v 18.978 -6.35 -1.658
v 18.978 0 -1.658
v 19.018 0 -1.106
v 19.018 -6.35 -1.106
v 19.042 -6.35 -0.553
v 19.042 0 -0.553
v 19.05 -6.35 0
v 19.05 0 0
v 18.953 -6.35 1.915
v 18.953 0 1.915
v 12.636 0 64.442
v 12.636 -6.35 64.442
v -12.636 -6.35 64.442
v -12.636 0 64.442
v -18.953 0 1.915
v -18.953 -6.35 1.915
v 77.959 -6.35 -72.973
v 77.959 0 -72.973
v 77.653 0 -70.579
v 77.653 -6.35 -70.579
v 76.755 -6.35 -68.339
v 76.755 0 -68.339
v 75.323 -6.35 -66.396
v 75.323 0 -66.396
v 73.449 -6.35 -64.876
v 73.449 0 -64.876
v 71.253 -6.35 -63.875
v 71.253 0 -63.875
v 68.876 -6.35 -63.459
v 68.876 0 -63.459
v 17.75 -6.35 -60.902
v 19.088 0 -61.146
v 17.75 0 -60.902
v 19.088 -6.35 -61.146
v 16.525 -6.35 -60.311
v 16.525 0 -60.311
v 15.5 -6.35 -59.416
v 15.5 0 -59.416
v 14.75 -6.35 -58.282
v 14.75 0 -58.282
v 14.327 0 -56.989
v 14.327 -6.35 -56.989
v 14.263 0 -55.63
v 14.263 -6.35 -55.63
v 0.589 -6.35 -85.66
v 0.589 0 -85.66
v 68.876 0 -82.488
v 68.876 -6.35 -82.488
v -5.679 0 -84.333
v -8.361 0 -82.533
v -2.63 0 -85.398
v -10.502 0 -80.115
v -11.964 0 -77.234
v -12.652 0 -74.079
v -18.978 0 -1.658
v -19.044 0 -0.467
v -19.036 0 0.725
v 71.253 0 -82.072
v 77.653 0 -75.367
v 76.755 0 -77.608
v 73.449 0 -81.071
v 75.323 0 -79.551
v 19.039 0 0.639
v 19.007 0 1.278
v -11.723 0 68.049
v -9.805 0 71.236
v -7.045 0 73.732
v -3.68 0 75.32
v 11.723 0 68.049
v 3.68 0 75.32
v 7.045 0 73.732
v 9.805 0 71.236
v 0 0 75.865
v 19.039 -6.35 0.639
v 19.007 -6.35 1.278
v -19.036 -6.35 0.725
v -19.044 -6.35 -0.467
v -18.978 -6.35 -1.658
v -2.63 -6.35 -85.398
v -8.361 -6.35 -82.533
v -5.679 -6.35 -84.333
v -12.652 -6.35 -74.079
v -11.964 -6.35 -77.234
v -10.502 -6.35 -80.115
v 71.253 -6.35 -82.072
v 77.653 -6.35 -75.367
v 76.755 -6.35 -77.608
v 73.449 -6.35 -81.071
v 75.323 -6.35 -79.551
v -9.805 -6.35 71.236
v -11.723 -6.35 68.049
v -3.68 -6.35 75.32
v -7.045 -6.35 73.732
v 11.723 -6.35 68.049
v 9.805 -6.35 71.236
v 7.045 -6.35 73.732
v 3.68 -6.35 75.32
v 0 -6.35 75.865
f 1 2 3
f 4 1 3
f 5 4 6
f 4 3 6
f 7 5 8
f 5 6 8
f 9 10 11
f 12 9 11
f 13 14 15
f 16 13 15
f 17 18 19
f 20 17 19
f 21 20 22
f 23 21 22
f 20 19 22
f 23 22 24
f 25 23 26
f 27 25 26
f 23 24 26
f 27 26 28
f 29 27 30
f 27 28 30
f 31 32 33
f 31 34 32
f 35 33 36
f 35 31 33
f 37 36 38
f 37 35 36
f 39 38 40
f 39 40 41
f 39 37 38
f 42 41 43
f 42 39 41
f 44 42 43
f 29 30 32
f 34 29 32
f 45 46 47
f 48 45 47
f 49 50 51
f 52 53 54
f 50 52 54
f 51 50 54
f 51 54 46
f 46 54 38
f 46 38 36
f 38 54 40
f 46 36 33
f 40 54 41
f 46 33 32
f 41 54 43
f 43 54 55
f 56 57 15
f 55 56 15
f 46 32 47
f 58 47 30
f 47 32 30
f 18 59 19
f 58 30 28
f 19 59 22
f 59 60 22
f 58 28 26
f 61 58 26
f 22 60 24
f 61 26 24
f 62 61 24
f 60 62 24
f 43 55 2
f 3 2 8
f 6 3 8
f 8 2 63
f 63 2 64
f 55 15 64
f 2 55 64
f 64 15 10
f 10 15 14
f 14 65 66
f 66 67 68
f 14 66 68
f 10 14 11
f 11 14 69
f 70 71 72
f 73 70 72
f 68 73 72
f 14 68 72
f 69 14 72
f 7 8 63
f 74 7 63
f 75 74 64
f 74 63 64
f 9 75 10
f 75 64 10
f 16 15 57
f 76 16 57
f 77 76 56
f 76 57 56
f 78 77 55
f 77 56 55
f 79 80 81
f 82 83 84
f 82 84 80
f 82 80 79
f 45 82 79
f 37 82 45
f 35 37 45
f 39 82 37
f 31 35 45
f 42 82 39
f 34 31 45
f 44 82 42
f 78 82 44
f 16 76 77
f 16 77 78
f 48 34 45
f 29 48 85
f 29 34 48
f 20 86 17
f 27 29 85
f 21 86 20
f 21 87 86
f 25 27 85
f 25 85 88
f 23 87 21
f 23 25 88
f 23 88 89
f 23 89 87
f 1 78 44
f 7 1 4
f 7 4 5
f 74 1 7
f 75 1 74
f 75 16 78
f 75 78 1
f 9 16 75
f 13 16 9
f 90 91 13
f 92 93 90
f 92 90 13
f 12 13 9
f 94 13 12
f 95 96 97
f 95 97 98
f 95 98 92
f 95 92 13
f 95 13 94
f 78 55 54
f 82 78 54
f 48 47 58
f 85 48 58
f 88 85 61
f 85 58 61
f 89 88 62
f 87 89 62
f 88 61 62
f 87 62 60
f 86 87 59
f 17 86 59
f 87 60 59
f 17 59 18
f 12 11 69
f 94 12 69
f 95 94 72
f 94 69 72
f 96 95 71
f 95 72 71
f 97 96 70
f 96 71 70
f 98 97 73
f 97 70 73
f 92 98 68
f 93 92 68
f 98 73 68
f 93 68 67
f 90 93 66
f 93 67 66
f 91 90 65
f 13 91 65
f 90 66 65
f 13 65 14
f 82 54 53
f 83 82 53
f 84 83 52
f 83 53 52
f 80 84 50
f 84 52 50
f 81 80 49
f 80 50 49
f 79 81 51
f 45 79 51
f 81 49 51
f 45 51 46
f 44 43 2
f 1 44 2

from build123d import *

# Parameters (mm, degrees)
F1_DEPTH = 6.35
F2_R     = 5.08


with BuildPart() as f1:
    # F0 (on Front) → F1 (new body)
    with BuildSketch(Plane.XZ):
        with BuildLine():
            ThreePointArc((18.9777384701, -1.657691938), (19.0319260436, -0.8296330951), (19.05, 0))
            ThreePointArc((19.05, 0), (19.0258577103, 0.9587692038), (18.9534920329, 1.9151082886))
            ThreePointArc((18.9534920329, 1.9151082886), (0, 19.05), (-18.9534920329, 1.9151082886))
            ThreePointArc((-18.9534920329, 1.9151082886), (-19.0495613397, 0.1292778667), (-18.9777384701, -1.657691938))
            ThreePointArc((-18.9777384701, -1.657691938), (0, -19.05), (18.9777384701, -1.657691938))
        make_face()
        with BuildLine():
            ThreePointArc((-18.9534920329, 1.9151082886), (0, 19.05), (18.9534920329, 1.9151082886))
            Line((18.9534920329, 1.9151082886), (12.6356613553, 64.4415743522))
            ThreePointArc((12.6356613553, 64.4415743522), (12.6839051402, 63.8040149624), (12.7, 63.1648354932))
            ThreePointArc((12.7, 63.1648354932), (-0.6391794692, 50.480930353), (-12.6356613553, 64.4415743522))
            Line((-12.6356613553, 64.4415743522), (-18.9534920329, 1.9151082886))
        make_face()
        with BuildLine():
            Line((13.8028917705, -60.9008390119), (18.9777384701, -1.657691938))
            ThreePointArc((18.9777384701, -1.657691938), (0, -19.05), (-18.9777384701, -1.657691938))
            Line((-18.9777384701, -1.657691938), (-12.6518256467, -74.0785781066))
            ThreePointArc((-12.6518256467, -74.0785781066), (-9.1612035414, -64.1778632049), (0.5892201669, -60.2871260312))
            Line((0.5892201669, -60.2871260312), (13.8028917705, -60.9008390119))
        make_face()
        with BuildLine():
            ThreePointArc((12.7, 63.1648354932), (12.6839051402, 63.8040149624), (12.6356613553, 64.4415743522))
            ThreePointArc((12.6356613553, 64.4415743522), (0, 75.8648354932), (-12.6356613553, 64.4415743522))
            ThreePointArc((-12.6356613553, 64.4415743522), (-0.6391794692, 50.480930353), (12.7, 63.1648354932))
        make_face()
        with BuildLine():
            Line((68.8755877414, -63.4587070604), (13.8028917705, -60.9008390119))
            Line((13.8028917705, -60.9008390119), (12.6518256467, -74.0785781066))
            ThreePointArc((12.6518256467, -74.0785781066), (8.795586943, -82.1346536894), (0.5892201669, -85.6597742647))
            Line((0.5892201669, -85.6597742647), (68.8755877414, -82.4881932355))
            ThreePointArc((68.8755877414, -82.4881932355), (58.9086726163, -72.973450148), (68.8755877414, -63.4587070604))
        make_face()
        with BuildLine():
            Line((12.6518256467, -74.0785781066), (13.8028917705, -60.9008390119))
            Line((13.8028917705, -60.9008390119), (0.5892201669, -60.2871260312))
            ThreePointArc((0.5892201669, -60.2871260312), (9.1862151107, -64.2039888224), (12.7, -72.973450148))
            ThreePointArc((12.7, -72.973450148), (12.6879506957, -73.526538878), (12.6518256467, -74.0785781066))
        make_face()
        with BuildLine():
            ThreePointArc((0.5892201669, -60.2871260312), (-9.1612035414, -64.1778632049), (-12.6518256467, -74.0785781066))
            ThreePointArc((-12.6518256467, -74.0785781066), (-8.3610788092, -82.5328623237), (0.5892201669, -85.6597742647))
            ThreePointArc((0.5892201669, -85.6597742647), (8.795586943, -82.1346536894), (12.6518256467, -74.0785781066))
            ThreePointArc((12.6518256467, -74.0785781066), (12.6879506957, -73.526538878), (12.7, -72.973450148))
            ThreePointArc((12.7, -72.973450148), (9.1862151107, -64.2039888224), (0.5892201669, -60.2871260312))
        make_face()
        with BuildLine():
            ThreePointArc((77.9586726163, -72.973450148), (75.3233339493, -66.3963541538), (68.8755877414, -63.4587070604))
            ThreePointArc((68.8755877414, -63.4587070604), (58.9086726163, -72.973450148), (68.8755877414, -82.4881932355))
            ThreePointArc((68.8755877414, -82.4881932355), (75.3233339493, -79.5505461421), (77.9586726163, -72.973450148))
        make_face()
    extrude(amount=F1_DEPTH)

    # F2
    f2_edges = [f1.edges().sort_by_distance(p)[0] for p in [
        (13.802892, -3.175, -60.900839),
    ]]
    fillet(f2_edges, radius=F2_R)


solid = f1.part
